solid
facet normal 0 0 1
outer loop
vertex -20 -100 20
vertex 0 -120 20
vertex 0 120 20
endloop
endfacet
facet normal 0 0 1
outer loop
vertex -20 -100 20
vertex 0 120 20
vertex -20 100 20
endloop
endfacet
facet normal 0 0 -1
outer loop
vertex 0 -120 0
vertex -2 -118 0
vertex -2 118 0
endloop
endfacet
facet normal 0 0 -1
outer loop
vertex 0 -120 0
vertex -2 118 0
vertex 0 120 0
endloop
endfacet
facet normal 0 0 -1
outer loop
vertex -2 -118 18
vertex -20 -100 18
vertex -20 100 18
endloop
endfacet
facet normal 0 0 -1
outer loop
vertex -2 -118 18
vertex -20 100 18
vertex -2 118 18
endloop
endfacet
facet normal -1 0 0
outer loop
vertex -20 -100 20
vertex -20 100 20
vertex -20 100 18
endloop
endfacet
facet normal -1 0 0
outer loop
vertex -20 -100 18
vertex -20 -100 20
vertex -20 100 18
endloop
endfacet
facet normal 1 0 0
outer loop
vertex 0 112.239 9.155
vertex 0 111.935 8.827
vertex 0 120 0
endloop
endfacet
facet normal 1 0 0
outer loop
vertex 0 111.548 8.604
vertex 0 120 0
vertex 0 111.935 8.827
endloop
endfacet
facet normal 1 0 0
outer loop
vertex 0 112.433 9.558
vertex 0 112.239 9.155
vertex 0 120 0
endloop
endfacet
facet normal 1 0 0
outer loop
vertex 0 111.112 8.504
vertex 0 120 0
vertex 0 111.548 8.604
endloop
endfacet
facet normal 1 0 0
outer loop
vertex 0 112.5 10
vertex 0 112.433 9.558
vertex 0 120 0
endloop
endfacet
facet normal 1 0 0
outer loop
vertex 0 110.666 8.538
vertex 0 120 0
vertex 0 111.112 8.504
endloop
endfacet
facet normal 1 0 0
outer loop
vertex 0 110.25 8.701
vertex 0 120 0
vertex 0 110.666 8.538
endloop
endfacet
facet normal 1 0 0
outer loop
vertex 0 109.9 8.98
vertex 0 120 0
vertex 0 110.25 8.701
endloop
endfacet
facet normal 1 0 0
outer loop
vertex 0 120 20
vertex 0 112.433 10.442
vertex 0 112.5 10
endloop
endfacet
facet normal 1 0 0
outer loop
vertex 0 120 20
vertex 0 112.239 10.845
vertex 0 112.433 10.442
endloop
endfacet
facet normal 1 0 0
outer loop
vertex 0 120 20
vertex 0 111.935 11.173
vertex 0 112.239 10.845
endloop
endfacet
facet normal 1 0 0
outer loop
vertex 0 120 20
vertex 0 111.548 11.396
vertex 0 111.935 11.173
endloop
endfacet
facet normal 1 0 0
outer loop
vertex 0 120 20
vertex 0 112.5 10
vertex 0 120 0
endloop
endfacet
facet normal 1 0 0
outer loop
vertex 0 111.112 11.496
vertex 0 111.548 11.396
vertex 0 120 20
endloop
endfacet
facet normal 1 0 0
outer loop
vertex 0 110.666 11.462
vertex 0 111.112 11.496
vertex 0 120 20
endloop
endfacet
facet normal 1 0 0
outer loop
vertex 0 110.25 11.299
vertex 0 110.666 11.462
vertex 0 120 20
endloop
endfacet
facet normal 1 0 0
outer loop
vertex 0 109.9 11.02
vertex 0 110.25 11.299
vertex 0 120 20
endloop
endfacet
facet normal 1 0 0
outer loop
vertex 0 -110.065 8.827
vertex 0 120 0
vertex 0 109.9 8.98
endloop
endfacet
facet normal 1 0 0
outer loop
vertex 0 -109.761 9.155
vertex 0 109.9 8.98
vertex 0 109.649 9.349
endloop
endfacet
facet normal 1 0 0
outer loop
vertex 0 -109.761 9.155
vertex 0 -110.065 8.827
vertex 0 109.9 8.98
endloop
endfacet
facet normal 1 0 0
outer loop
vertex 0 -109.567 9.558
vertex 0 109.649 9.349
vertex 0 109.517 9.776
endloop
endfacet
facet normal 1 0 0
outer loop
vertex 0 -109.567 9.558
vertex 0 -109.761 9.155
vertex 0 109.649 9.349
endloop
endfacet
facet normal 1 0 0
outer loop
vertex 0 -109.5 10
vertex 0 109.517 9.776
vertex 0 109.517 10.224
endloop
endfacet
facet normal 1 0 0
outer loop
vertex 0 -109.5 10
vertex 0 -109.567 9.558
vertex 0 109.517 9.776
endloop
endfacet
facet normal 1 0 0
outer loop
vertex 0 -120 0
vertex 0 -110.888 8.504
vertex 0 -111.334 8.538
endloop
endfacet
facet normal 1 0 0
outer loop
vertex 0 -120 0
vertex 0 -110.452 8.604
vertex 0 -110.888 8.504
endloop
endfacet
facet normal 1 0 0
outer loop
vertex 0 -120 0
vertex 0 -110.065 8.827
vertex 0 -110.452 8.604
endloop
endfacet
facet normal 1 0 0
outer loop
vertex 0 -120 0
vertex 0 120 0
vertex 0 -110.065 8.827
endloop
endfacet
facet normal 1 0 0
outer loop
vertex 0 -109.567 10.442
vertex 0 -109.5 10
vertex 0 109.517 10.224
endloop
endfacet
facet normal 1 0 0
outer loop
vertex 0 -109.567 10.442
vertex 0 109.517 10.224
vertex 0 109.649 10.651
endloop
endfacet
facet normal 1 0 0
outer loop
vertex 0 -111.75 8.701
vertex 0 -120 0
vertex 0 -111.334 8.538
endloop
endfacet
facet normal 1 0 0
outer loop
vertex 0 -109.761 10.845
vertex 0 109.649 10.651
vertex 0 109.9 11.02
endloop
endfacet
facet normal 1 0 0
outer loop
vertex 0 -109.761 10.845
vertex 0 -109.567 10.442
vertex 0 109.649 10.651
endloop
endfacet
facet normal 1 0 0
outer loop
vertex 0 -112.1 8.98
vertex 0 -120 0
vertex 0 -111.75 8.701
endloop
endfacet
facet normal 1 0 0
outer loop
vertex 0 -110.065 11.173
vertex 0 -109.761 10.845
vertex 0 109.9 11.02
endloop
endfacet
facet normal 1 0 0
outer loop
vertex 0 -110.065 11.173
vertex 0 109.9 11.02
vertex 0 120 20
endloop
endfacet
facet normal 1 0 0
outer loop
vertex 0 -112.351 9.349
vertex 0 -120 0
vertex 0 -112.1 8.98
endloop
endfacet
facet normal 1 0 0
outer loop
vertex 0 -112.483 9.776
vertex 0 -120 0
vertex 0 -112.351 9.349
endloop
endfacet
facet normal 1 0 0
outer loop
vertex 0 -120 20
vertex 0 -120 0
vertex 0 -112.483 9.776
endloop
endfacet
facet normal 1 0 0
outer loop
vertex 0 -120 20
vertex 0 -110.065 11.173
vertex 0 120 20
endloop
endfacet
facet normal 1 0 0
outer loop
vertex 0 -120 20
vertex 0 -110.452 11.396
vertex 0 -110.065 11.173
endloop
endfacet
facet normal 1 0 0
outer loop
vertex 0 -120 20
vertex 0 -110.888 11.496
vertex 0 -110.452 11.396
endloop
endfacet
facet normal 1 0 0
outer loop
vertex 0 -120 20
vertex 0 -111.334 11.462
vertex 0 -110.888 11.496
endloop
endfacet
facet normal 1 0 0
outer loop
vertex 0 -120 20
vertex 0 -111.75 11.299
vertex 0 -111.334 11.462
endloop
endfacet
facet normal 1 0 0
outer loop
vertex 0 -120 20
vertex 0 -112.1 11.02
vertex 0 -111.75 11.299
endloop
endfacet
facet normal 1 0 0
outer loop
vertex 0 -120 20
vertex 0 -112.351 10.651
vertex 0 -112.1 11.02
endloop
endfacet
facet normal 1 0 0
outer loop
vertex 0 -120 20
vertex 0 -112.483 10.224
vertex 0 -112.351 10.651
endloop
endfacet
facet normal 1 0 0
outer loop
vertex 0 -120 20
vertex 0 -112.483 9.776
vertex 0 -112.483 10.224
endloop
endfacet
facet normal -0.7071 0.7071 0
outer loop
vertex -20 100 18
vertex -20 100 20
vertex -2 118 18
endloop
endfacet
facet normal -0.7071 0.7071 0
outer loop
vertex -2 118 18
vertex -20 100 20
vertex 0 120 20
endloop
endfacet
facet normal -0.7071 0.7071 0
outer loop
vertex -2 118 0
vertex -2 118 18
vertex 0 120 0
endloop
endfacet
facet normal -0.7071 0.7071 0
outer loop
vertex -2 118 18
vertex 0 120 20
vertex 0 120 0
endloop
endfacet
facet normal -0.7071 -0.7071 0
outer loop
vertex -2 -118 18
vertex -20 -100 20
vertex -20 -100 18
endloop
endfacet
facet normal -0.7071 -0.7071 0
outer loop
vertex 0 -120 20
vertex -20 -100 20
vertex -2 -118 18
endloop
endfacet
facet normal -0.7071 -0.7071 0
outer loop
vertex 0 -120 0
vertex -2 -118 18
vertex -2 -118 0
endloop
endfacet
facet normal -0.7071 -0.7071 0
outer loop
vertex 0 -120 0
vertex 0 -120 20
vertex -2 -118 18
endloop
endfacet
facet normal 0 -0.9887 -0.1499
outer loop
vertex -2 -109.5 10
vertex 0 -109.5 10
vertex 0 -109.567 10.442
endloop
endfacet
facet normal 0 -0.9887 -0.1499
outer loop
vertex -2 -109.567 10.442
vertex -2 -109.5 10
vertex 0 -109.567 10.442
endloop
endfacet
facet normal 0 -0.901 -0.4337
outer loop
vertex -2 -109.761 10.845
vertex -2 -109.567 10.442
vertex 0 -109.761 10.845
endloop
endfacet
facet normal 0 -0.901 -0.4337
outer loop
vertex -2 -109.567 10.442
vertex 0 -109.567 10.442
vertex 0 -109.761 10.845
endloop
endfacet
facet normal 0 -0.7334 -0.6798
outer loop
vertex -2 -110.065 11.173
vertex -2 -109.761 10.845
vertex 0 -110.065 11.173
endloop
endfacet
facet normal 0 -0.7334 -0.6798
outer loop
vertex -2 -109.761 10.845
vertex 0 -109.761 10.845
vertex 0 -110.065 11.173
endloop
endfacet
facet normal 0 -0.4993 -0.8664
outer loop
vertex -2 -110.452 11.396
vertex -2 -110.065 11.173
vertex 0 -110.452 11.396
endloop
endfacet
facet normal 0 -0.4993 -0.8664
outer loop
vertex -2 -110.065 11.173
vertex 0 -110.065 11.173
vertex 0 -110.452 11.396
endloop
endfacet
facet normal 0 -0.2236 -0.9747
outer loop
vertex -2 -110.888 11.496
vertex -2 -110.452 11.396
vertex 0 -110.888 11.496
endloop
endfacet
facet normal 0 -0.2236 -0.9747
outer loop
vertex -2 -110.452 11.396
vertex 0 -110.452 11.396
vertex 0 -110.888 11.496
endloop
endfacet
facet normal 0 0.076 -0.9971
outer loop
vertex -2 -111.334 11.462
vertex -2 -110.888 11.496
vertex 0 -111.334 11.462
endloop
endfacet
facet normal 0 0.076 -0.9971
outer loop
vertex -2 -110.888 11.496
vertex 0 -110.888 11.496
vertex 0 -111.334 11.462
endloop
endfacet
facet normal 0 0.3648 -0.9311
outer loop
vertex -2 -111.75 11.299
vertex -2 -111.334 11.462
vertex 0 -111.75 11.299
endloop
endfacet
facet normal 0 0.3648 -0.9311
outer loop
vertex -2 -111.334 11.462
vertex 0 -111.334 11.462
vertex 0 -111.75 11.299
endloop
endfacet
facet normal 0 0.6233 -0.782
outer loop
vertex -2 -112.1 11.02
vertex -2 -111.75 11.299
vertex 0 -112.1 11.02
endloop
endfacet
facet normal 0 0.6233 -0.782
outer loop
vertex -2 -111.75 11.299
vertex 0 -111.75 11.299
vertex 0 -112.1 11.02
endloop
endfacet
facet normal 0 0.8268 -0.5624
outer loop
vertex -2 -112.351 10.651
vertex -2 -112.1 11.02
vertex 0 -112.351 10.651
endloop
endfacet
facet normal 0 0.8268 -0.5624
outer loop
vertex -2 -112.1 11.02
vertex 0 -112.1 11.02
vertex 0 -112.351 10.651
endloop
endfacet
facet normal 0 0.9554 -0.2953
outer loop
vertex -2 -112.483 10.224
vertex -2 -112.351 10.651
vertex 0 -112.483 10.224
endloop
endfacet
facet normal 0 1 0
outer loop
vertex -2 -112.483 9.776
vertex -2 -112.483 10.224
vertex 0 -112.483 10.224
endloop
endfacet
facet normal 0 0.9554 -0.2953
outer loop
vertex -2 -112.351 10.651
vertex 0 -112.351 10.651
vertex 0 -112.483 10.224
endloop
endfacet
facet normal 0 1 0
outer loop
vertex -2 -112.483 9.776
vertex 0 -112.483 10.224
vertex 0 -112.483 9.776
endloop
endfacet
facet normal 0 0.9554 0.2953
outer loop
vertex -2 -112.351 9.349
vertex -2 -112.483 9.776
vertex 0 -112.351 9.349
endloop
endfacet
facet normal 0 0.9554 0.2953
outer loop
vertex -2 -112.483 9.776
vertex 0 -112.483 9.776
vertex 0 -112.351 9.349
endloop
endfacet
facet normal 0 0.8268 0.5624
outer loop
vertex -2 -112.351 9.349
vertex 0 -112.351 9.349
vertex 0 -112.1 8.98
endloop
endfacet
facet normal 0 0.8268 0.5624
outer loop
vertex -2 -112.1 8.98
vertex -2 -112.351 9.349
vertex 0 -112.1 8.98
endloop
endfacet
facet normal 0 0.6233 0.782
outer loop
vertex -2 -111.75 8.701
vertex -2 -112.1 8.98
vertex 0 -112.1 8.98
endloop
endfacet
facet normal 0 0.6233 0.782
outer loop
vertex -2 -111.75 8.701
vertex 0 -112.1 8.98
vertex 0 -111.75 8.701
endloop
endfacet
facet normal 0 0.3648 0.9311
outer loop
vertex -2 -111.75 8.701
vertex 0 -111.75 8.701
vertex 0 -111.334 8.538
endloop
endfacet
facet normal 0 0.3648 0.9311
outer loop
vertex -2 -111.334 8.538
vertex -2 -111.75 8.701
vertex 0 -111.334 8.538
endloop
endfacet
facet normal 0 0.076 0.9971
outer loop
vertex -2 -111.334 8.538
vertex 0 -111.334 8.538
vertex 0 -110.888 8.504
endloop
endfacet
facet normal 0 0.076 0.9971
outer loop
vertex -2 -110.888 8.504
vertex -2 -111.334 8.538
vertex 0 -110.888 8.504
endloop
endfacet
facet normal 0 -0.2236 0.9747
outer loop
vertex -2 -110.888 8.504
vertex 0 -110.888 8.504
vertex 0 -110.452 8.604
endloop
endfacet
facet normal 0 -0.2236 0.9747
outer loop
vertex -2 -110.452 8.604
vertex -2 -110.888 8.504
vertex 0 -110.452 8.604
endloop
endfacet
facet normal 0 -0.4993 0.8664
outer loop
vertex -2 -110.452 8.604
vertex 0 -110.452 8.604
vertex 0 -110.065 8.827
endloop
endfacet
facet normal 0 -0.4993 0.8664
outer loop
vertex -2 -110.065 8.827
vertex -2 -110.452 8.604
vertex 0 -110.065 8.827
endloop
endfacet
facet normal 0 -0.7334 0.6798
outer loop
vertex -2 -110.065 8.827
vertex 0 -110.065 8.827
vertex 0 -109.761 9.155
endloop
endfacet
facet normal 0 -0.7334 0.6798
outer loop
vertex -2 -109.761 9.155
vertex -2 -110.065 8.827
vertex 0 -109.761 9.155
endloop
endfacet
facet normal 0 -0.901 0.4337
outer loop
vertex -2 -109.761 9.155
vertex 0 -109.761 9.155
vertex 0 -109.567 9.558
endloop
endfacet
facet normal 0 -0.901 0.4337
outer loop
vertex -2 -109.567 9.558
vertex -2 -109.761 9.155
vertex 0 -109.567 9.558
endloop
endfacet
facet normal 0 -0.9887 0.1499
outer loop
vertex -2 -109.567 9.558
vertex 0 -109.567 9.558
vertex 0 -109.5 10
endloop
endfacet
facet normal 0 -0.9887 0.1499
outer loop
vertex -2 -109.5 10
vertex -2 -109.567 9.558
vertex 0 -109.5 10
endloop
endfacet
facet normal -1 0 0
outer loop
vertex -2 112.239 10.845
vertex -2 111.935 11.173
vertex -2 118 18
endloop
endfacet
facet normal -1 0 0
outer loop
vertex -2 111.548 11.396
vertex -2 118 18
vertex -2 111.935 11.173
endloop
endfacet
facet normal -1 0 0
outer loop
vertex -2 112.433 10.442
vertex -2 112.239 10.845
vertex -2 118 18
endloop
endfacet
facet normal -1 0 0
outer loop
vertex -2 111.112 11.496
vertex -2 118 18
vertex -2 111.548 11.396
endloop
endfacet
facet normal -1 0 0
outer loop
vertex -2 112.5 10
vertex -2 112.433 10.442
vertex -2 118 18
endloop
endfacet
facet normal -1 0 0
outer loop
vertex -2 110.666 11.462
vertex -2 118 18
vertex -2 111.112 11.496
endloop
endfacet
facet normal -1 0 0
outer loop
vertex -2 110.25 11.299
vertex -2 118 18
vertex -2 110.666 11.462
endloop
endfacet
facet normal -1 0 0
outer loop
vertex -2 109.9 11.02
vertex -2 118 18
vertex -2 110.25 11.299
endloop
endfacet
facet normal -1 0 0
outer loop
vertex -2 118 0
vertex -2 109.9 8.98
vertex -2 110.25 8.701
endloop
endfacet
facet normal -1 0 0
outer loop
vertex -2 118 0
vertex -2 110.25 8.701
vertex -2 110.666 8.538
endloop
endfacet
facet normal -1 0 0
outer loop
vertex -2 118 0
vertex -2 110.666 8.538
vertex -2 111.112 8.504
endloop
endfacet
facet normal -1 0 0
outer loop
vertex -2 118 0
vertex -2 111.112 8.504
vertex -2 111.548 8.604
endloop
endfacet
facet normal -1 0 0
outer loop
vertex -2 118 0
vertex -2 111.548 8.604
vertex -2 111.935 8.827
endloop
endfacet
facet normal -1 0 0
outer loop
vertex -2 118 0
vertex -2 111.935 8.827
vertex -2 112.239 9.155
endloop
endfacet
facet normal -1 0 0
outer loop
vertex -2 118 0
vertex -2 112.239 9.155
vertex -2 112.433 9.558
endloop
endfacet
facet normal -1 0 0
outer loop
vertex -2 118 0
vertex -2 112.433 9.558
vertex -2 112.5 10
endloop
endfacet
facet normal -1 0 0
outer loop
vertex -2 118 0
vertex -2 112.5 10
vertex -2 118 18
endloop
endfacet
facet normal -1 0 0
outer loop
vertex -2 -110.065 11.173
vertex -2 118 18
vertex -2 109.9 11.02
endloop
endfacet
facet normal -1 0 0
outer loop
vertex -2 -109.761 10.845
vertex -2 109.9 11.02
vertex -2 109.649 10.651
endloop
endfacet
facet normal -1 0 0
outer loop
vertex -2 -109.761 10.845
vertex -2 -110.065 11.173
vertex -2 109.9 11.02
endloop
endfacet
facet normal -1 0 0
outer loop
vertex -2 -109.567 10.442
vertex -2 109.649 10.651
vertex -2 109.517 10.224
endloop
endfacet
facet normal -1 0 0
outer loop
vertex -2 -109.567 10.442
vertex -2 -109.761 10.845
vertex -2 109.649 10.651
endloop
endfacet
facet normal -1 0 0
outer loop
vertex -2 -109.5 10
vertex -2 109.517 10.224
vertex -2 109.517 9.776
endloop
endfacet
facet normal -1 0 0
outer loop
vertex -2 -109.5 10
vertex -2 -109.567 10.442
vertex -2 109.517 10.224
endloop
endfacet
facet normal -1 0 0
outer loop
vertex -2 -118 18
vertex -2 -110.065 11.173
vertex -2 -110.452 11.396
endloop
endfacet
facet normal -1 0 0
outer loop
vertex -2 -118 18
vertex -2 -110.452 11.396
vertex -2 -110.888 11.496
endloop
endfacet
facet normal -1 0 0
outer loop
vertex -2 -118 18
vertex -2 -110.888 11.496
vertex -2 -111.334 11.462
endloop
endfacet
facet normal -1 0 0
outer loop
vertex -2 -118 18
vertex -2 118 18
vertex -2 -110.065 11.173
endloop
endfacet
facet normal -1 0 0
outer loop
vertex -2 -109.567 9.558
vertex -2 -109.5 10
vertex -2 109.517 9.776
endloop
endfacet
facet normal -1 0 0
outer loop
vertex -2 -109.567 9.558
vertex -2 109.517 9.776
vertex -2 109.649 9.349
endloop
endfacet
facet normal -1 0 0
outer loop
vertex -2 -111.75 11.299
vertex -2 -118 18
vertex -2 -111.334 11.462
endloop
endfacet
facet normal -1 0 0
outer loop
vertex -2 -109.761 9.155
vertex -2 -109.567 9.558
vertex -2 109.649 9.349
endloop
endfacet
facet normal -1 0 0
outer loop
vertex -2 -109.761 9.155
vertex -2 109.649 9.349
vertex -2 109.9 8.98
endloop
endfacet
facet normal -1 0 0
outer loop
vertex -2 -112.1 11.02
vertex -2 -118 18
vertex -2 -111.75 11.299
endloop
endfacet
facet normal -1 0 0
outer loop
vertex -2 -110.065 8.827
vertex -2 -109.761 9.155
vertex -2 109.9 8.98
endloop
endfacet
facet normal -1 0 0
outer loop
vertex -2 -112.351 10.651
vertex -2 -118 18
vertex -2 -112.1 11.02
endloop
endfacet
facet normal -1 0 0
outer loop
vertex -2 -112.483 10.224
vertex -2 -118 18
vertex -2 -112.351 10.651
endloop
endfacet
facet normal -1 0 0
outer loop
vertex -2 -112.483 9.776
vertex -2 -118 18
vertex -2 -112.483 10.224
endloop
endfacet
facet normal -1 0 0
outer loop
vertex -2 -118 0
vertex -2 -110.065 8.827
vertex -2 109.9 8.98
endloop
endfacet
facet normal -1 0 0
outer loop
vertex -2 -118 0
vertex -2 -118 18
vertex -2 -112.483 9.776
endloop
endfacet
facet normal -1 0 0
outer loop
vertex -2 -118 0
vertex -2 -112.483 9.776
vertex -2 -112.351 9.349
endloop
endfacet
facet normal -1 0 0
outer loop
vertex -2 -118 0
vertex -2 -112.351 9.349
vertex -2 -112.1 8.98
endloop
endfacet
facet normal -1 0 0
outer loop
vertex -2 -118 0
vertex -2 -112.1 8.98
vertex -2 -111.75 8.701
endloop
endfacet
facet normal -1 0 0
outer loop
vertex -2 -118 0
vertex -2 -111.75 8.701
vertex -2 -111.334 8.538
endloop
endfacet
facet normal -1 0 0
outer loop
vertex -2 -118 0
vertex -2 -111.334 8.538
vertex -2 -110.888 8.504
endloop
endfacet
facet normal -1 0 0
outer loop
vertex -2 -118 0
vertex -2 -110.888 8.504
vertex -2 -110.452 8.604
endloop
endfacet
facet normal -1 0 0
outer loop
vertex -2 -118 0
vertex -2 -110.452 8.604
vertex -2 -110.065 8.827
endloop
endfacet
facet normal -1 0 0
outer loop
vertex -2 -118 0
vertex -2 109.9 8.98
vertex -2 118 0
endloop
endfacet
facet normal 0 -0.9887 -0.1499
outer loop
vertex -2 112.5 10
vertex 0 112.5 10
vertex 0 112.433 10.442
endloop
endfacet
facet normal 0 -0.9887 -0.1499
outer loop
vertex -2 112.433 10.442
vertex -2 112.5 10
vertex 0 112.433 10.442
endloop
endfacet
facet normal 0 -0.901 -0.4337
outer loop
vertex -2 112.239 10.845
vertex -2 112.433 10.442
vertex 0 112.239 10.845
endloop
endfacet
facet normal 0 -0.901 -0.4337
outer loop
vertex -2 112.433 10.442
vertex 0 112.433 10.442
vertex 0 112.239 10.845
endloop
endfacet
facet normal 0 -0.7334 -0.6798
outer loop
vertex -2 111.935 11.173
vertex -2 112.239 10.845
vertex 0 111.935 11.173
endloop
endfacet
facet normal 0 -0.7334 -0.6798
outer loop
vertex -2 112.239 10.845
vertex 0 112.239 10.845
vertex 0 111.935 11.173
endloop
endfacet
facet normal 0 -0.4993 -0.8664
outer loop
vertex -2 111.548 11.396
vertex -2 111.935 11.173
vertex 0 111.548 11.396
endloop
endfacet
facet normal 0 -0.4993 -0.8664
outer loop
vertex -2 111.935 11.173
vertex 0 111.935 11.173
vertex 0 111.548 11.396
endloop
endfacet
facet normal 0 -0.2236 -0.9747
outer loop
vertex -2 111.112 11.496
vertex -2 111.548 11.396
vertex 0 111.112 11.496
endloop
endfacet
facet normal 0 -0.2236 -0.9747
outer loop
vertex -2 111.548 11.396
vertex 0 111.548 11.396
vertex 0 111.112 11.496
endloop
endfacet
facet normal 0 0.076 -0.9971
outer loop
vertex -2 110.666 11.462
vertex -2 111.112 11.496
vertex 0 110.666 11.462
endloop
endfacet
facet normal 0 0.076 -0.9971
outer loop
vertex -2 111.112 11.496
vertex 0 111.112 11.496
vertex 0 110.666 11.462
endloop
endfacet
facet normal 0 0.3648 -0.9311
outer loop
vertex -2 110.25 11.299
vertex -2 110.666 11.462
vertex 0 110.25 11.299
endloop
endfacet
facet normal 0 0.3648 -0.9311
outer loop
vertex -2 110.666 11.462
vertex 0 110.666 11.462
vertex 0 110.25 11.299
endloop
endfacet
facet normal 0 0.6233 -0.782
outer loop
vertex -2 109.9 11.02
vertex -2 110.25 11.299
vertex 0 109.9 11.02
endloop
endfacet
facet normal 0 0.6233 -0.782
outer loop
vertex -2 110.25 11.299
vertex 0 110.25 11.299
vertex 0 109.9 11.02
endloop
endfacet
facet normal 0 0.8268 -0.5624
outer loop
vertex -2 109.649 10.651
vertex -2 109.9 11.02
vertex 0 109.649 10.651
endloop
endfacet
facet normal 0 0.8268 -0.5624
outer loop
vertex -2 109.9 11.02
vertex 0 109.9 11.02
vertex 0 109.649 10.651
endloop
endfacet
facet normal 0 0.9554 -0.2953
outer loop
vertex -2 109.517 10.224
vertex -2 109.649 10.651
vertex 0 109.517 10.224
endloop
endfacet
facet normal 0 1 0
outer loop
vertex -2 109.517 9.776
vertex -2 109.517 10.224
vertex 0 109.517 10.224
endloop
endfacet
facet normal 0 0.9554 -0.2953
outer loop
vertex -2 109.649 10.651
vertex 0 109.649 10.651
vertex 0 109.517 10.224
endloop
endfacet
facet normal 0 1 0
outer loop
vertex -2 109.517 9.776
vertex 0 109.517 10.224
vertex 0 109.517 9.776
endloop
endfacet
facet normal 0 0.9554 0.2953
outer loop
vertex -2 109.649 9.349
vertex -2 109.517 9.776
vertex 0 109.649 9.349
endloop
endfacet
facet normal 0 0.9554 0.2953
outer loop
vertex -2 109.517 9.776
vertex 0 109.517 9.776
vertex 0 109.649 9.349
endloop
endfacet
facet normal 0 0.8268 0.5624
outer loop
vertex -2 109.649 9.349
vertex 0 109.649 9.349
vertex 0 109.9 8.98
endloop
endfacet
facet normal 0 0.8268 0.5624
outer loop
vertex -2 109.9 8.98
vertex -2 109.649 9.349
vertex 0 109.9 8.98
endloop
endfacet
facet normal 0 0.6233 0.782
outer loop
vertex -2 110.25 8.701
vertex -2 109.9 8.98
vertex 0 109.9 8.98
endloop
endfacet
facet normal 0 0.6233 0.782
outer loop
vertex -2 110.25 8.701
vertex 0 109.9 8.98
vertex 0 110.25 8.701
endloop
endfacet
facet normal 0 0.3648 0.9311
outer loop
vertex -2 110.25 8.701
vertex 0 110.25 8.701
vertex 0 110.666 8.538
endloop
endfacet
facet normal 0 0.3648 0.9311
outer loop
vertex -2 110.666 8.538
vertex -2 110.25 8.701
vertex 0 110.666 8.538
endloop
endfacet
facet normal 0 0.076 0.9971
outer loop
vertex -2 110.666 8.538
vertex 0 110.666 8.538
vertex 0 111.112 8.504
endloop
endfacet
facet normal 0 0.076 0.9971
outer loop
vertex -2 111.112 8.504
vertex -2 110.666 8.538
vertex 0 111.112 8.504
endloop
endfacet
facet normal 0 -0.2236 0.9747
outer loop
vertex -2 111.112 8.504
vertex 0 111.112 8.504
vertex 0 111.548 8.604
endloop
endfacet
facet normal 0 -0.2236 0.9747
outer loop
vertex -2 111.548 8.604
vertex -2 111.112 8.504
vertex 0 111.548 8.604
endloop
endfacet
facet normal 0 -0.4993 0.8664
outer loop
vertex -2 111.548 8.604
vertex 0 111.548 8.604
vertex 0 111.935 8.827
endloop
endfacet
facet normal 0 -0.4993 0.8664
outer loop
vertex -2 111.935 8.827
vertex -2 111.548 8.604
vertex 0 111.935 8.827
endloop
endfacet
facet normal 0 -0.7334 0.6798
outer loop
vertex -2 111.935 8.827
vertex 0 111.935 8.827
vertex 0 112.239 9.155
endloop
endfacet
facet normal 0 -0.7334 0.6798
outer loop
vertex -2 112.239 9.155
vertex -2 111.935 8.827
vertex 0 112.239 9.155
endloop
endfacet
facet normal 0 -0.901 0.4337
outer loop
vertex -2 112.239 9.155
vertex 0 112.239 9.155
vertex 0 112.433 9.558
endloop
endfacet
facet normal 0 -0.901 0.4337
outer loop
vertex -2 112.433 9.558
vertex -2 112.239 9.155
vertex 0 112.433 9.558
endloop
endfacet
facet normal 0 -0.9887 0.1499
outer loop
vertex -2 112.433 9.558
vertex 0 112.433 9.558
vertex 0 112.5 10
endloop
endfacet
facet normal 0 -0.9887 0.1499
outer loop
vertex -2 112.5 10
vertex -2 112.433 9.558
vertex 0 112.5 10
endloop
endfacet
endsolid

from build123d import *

# Parameters (mm, degrees)
F1_DEPTH = 120
F2_SIZE  = 19.99999
F3_R     = 1.5
F4_DEPTH = 20.001


# Not quite as in the source:
# - a fillet or chamfer is up to 0.001 mm smaller than in the source, because OpenCascade refuses the exact size


with BuildPart() as f1:
    # F0 (on Front) → F1 (new body, symmetric)
    with BuildSketch(Plane.XZ):
        Polygon((-2, 0), (0, 0), (0, 20), (-20, 20), (-20, 18), (-2, 18), align=None)
    extrude(amount=F1_DEPTH, both=True)

    # F2 (size 20 in the source; OpenCascade refuses exactly that, so slightly less here)
    f2_edges = [f1.edges().sort_by_distance(p)[0] for p in [
        (-20, -120, 19),
        (-20, 120, 19),
    ]]
    chamfer(f2_edges, length=F2_SIZE)

    # F3 (on face) → F4 (cut, through all)
    with BuildSketch(Plane.YZ):
        with Locations((111, 10)):
            Circle(F3_R)
        with Locations((-111, 10)):
            Circle(F3_R)
    extrude(amount=-F4_DEPTH, mode=Mode.SUBTRACT)


solid = f1.part
